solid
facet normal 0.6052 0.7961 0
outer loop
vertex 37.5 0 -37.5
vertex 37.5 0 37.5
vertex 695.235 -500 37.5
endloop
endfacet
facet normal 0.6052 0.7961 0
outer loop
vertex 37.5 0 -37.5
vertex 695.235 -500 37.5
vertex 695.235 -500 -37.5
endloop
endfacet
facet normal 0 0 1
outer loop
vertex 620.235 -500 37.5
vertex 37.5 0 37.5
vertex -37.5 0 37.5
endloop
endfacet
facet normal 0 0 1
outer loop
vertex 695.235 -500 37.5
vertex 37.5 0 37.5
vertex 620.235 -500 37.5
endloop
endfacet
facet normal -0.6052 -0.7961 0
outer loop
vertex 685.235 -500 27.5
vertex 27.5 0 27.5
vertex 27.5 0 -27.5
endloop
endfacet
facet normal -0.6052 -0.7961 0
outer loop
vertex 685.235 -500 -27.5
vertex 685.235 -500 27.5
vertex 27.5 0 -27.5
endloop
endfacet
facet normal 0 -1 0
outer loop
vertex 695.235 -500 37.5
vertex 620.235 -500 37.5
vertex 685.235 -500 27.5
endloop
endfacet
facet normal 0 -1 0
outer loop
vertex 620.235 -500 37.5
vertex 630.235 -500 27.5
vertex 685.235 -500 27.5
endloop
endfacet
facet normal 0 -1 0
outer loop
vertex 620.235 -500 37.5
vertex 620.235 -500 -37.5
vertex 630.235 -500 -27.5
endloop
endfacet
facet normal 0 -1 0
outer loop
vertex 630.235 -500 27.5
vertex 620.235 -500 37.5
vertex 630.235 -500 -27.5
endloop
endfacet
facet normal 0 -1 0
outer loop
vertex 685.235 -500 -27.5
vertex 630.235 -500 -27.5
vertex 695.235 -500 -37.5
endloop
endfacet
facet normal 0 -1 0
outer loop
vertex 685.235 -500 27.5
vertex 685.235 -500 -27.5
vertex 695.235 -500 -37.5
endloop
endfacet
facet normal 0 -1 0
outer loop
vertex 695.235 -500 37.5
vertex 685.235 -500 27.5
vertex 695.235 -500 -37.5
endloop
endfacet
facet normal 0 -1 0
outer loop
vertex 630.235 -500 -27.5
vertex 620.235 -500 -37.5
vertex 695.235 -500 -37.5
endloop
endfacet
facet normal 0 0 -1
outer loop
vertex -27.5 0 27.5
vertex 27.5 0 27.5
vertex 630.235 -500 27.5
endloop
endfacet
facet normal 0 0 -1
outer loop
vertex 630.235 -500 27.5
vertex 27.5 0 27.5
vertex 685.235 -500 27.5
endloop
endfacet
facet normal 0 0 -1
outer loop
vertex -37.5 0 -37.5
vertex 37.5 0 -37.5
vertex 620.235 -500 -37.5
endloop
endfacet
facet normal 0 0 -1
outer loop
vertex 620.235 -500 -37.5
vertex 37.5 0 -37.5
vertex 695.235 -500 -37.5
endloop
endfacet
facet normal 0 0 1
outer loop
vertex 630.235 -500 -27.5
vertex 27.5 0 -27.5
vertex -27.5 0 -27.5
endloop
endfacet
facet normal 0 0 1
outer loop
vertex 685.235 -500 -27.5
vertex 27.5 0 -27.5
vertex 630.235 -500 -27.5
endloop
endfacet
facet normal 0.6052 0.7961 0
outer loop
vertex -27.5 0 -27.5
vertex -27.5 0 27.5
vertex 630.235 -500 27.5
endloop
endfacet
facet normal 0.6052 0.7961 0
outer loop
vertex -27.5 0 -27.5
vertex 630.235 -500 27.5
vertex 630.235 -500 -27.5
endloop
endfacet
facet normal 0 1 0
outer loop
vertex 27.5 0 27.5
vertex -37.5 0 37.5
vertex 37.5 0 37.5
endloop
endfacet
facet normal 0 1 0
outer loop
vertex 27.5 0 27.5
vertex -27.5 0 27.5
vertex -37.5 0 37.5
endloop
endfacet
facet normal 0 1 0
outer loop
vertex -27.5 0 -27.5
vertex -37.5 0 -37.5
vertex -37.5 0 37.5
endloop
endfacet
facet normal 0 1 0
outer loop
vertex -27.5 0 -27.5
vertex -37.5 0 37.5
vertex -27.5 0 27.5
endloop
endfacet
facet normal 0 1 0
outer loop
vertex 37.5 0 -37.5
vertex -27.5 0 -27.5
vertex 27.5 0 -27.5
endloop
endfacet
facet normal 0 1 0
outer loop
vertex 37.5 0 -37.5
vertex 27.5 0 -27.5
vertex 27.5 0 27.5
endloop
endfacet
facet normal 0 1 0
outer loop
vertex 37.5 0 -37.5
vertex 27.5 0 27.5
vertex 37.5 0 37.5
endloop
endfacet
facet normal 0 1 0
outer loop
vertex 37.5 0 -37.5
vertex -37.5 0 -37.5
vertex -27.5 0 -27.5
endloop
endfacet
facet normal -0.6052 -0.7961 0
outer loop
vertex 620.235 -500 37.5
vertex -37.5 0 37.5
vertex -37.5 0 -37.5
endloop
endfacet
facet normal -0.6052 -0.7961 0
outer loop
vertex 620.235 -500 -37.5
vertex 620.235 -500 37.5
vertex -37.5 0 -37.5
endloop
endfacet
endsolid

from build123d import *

# Parameters (mm, degrees)
SKETCH3_W           = 75
SKETCH3_H           = 75
SKETCH3_W_2         = 55
SKETCH3_H_2         = 55
BOSS_EXTRUDE2_DEPTH = 826.205


with BuildPart() as part:
    # Sketch3 → Boss-Extrude2 (new, along a direction that is not the sketch's normal)
    with BuildSketch(Plane(origin=(0, 0, 0), x_dir=(1, 0, 0), z_dir=(0, 1, 0))):
        Rectangle(SKETCH3_W, SKETCH3_H)
        Rectangle(SKETCH3_W_2, SKETCH3_H_2, mode=Mode.SUBTRACT)
    extrude(amount=-BOSS_EXTRUDE2_DEPTH, dir=(-0.7960914026765946, 0.6051764028648275, 0))


solid = part.part
